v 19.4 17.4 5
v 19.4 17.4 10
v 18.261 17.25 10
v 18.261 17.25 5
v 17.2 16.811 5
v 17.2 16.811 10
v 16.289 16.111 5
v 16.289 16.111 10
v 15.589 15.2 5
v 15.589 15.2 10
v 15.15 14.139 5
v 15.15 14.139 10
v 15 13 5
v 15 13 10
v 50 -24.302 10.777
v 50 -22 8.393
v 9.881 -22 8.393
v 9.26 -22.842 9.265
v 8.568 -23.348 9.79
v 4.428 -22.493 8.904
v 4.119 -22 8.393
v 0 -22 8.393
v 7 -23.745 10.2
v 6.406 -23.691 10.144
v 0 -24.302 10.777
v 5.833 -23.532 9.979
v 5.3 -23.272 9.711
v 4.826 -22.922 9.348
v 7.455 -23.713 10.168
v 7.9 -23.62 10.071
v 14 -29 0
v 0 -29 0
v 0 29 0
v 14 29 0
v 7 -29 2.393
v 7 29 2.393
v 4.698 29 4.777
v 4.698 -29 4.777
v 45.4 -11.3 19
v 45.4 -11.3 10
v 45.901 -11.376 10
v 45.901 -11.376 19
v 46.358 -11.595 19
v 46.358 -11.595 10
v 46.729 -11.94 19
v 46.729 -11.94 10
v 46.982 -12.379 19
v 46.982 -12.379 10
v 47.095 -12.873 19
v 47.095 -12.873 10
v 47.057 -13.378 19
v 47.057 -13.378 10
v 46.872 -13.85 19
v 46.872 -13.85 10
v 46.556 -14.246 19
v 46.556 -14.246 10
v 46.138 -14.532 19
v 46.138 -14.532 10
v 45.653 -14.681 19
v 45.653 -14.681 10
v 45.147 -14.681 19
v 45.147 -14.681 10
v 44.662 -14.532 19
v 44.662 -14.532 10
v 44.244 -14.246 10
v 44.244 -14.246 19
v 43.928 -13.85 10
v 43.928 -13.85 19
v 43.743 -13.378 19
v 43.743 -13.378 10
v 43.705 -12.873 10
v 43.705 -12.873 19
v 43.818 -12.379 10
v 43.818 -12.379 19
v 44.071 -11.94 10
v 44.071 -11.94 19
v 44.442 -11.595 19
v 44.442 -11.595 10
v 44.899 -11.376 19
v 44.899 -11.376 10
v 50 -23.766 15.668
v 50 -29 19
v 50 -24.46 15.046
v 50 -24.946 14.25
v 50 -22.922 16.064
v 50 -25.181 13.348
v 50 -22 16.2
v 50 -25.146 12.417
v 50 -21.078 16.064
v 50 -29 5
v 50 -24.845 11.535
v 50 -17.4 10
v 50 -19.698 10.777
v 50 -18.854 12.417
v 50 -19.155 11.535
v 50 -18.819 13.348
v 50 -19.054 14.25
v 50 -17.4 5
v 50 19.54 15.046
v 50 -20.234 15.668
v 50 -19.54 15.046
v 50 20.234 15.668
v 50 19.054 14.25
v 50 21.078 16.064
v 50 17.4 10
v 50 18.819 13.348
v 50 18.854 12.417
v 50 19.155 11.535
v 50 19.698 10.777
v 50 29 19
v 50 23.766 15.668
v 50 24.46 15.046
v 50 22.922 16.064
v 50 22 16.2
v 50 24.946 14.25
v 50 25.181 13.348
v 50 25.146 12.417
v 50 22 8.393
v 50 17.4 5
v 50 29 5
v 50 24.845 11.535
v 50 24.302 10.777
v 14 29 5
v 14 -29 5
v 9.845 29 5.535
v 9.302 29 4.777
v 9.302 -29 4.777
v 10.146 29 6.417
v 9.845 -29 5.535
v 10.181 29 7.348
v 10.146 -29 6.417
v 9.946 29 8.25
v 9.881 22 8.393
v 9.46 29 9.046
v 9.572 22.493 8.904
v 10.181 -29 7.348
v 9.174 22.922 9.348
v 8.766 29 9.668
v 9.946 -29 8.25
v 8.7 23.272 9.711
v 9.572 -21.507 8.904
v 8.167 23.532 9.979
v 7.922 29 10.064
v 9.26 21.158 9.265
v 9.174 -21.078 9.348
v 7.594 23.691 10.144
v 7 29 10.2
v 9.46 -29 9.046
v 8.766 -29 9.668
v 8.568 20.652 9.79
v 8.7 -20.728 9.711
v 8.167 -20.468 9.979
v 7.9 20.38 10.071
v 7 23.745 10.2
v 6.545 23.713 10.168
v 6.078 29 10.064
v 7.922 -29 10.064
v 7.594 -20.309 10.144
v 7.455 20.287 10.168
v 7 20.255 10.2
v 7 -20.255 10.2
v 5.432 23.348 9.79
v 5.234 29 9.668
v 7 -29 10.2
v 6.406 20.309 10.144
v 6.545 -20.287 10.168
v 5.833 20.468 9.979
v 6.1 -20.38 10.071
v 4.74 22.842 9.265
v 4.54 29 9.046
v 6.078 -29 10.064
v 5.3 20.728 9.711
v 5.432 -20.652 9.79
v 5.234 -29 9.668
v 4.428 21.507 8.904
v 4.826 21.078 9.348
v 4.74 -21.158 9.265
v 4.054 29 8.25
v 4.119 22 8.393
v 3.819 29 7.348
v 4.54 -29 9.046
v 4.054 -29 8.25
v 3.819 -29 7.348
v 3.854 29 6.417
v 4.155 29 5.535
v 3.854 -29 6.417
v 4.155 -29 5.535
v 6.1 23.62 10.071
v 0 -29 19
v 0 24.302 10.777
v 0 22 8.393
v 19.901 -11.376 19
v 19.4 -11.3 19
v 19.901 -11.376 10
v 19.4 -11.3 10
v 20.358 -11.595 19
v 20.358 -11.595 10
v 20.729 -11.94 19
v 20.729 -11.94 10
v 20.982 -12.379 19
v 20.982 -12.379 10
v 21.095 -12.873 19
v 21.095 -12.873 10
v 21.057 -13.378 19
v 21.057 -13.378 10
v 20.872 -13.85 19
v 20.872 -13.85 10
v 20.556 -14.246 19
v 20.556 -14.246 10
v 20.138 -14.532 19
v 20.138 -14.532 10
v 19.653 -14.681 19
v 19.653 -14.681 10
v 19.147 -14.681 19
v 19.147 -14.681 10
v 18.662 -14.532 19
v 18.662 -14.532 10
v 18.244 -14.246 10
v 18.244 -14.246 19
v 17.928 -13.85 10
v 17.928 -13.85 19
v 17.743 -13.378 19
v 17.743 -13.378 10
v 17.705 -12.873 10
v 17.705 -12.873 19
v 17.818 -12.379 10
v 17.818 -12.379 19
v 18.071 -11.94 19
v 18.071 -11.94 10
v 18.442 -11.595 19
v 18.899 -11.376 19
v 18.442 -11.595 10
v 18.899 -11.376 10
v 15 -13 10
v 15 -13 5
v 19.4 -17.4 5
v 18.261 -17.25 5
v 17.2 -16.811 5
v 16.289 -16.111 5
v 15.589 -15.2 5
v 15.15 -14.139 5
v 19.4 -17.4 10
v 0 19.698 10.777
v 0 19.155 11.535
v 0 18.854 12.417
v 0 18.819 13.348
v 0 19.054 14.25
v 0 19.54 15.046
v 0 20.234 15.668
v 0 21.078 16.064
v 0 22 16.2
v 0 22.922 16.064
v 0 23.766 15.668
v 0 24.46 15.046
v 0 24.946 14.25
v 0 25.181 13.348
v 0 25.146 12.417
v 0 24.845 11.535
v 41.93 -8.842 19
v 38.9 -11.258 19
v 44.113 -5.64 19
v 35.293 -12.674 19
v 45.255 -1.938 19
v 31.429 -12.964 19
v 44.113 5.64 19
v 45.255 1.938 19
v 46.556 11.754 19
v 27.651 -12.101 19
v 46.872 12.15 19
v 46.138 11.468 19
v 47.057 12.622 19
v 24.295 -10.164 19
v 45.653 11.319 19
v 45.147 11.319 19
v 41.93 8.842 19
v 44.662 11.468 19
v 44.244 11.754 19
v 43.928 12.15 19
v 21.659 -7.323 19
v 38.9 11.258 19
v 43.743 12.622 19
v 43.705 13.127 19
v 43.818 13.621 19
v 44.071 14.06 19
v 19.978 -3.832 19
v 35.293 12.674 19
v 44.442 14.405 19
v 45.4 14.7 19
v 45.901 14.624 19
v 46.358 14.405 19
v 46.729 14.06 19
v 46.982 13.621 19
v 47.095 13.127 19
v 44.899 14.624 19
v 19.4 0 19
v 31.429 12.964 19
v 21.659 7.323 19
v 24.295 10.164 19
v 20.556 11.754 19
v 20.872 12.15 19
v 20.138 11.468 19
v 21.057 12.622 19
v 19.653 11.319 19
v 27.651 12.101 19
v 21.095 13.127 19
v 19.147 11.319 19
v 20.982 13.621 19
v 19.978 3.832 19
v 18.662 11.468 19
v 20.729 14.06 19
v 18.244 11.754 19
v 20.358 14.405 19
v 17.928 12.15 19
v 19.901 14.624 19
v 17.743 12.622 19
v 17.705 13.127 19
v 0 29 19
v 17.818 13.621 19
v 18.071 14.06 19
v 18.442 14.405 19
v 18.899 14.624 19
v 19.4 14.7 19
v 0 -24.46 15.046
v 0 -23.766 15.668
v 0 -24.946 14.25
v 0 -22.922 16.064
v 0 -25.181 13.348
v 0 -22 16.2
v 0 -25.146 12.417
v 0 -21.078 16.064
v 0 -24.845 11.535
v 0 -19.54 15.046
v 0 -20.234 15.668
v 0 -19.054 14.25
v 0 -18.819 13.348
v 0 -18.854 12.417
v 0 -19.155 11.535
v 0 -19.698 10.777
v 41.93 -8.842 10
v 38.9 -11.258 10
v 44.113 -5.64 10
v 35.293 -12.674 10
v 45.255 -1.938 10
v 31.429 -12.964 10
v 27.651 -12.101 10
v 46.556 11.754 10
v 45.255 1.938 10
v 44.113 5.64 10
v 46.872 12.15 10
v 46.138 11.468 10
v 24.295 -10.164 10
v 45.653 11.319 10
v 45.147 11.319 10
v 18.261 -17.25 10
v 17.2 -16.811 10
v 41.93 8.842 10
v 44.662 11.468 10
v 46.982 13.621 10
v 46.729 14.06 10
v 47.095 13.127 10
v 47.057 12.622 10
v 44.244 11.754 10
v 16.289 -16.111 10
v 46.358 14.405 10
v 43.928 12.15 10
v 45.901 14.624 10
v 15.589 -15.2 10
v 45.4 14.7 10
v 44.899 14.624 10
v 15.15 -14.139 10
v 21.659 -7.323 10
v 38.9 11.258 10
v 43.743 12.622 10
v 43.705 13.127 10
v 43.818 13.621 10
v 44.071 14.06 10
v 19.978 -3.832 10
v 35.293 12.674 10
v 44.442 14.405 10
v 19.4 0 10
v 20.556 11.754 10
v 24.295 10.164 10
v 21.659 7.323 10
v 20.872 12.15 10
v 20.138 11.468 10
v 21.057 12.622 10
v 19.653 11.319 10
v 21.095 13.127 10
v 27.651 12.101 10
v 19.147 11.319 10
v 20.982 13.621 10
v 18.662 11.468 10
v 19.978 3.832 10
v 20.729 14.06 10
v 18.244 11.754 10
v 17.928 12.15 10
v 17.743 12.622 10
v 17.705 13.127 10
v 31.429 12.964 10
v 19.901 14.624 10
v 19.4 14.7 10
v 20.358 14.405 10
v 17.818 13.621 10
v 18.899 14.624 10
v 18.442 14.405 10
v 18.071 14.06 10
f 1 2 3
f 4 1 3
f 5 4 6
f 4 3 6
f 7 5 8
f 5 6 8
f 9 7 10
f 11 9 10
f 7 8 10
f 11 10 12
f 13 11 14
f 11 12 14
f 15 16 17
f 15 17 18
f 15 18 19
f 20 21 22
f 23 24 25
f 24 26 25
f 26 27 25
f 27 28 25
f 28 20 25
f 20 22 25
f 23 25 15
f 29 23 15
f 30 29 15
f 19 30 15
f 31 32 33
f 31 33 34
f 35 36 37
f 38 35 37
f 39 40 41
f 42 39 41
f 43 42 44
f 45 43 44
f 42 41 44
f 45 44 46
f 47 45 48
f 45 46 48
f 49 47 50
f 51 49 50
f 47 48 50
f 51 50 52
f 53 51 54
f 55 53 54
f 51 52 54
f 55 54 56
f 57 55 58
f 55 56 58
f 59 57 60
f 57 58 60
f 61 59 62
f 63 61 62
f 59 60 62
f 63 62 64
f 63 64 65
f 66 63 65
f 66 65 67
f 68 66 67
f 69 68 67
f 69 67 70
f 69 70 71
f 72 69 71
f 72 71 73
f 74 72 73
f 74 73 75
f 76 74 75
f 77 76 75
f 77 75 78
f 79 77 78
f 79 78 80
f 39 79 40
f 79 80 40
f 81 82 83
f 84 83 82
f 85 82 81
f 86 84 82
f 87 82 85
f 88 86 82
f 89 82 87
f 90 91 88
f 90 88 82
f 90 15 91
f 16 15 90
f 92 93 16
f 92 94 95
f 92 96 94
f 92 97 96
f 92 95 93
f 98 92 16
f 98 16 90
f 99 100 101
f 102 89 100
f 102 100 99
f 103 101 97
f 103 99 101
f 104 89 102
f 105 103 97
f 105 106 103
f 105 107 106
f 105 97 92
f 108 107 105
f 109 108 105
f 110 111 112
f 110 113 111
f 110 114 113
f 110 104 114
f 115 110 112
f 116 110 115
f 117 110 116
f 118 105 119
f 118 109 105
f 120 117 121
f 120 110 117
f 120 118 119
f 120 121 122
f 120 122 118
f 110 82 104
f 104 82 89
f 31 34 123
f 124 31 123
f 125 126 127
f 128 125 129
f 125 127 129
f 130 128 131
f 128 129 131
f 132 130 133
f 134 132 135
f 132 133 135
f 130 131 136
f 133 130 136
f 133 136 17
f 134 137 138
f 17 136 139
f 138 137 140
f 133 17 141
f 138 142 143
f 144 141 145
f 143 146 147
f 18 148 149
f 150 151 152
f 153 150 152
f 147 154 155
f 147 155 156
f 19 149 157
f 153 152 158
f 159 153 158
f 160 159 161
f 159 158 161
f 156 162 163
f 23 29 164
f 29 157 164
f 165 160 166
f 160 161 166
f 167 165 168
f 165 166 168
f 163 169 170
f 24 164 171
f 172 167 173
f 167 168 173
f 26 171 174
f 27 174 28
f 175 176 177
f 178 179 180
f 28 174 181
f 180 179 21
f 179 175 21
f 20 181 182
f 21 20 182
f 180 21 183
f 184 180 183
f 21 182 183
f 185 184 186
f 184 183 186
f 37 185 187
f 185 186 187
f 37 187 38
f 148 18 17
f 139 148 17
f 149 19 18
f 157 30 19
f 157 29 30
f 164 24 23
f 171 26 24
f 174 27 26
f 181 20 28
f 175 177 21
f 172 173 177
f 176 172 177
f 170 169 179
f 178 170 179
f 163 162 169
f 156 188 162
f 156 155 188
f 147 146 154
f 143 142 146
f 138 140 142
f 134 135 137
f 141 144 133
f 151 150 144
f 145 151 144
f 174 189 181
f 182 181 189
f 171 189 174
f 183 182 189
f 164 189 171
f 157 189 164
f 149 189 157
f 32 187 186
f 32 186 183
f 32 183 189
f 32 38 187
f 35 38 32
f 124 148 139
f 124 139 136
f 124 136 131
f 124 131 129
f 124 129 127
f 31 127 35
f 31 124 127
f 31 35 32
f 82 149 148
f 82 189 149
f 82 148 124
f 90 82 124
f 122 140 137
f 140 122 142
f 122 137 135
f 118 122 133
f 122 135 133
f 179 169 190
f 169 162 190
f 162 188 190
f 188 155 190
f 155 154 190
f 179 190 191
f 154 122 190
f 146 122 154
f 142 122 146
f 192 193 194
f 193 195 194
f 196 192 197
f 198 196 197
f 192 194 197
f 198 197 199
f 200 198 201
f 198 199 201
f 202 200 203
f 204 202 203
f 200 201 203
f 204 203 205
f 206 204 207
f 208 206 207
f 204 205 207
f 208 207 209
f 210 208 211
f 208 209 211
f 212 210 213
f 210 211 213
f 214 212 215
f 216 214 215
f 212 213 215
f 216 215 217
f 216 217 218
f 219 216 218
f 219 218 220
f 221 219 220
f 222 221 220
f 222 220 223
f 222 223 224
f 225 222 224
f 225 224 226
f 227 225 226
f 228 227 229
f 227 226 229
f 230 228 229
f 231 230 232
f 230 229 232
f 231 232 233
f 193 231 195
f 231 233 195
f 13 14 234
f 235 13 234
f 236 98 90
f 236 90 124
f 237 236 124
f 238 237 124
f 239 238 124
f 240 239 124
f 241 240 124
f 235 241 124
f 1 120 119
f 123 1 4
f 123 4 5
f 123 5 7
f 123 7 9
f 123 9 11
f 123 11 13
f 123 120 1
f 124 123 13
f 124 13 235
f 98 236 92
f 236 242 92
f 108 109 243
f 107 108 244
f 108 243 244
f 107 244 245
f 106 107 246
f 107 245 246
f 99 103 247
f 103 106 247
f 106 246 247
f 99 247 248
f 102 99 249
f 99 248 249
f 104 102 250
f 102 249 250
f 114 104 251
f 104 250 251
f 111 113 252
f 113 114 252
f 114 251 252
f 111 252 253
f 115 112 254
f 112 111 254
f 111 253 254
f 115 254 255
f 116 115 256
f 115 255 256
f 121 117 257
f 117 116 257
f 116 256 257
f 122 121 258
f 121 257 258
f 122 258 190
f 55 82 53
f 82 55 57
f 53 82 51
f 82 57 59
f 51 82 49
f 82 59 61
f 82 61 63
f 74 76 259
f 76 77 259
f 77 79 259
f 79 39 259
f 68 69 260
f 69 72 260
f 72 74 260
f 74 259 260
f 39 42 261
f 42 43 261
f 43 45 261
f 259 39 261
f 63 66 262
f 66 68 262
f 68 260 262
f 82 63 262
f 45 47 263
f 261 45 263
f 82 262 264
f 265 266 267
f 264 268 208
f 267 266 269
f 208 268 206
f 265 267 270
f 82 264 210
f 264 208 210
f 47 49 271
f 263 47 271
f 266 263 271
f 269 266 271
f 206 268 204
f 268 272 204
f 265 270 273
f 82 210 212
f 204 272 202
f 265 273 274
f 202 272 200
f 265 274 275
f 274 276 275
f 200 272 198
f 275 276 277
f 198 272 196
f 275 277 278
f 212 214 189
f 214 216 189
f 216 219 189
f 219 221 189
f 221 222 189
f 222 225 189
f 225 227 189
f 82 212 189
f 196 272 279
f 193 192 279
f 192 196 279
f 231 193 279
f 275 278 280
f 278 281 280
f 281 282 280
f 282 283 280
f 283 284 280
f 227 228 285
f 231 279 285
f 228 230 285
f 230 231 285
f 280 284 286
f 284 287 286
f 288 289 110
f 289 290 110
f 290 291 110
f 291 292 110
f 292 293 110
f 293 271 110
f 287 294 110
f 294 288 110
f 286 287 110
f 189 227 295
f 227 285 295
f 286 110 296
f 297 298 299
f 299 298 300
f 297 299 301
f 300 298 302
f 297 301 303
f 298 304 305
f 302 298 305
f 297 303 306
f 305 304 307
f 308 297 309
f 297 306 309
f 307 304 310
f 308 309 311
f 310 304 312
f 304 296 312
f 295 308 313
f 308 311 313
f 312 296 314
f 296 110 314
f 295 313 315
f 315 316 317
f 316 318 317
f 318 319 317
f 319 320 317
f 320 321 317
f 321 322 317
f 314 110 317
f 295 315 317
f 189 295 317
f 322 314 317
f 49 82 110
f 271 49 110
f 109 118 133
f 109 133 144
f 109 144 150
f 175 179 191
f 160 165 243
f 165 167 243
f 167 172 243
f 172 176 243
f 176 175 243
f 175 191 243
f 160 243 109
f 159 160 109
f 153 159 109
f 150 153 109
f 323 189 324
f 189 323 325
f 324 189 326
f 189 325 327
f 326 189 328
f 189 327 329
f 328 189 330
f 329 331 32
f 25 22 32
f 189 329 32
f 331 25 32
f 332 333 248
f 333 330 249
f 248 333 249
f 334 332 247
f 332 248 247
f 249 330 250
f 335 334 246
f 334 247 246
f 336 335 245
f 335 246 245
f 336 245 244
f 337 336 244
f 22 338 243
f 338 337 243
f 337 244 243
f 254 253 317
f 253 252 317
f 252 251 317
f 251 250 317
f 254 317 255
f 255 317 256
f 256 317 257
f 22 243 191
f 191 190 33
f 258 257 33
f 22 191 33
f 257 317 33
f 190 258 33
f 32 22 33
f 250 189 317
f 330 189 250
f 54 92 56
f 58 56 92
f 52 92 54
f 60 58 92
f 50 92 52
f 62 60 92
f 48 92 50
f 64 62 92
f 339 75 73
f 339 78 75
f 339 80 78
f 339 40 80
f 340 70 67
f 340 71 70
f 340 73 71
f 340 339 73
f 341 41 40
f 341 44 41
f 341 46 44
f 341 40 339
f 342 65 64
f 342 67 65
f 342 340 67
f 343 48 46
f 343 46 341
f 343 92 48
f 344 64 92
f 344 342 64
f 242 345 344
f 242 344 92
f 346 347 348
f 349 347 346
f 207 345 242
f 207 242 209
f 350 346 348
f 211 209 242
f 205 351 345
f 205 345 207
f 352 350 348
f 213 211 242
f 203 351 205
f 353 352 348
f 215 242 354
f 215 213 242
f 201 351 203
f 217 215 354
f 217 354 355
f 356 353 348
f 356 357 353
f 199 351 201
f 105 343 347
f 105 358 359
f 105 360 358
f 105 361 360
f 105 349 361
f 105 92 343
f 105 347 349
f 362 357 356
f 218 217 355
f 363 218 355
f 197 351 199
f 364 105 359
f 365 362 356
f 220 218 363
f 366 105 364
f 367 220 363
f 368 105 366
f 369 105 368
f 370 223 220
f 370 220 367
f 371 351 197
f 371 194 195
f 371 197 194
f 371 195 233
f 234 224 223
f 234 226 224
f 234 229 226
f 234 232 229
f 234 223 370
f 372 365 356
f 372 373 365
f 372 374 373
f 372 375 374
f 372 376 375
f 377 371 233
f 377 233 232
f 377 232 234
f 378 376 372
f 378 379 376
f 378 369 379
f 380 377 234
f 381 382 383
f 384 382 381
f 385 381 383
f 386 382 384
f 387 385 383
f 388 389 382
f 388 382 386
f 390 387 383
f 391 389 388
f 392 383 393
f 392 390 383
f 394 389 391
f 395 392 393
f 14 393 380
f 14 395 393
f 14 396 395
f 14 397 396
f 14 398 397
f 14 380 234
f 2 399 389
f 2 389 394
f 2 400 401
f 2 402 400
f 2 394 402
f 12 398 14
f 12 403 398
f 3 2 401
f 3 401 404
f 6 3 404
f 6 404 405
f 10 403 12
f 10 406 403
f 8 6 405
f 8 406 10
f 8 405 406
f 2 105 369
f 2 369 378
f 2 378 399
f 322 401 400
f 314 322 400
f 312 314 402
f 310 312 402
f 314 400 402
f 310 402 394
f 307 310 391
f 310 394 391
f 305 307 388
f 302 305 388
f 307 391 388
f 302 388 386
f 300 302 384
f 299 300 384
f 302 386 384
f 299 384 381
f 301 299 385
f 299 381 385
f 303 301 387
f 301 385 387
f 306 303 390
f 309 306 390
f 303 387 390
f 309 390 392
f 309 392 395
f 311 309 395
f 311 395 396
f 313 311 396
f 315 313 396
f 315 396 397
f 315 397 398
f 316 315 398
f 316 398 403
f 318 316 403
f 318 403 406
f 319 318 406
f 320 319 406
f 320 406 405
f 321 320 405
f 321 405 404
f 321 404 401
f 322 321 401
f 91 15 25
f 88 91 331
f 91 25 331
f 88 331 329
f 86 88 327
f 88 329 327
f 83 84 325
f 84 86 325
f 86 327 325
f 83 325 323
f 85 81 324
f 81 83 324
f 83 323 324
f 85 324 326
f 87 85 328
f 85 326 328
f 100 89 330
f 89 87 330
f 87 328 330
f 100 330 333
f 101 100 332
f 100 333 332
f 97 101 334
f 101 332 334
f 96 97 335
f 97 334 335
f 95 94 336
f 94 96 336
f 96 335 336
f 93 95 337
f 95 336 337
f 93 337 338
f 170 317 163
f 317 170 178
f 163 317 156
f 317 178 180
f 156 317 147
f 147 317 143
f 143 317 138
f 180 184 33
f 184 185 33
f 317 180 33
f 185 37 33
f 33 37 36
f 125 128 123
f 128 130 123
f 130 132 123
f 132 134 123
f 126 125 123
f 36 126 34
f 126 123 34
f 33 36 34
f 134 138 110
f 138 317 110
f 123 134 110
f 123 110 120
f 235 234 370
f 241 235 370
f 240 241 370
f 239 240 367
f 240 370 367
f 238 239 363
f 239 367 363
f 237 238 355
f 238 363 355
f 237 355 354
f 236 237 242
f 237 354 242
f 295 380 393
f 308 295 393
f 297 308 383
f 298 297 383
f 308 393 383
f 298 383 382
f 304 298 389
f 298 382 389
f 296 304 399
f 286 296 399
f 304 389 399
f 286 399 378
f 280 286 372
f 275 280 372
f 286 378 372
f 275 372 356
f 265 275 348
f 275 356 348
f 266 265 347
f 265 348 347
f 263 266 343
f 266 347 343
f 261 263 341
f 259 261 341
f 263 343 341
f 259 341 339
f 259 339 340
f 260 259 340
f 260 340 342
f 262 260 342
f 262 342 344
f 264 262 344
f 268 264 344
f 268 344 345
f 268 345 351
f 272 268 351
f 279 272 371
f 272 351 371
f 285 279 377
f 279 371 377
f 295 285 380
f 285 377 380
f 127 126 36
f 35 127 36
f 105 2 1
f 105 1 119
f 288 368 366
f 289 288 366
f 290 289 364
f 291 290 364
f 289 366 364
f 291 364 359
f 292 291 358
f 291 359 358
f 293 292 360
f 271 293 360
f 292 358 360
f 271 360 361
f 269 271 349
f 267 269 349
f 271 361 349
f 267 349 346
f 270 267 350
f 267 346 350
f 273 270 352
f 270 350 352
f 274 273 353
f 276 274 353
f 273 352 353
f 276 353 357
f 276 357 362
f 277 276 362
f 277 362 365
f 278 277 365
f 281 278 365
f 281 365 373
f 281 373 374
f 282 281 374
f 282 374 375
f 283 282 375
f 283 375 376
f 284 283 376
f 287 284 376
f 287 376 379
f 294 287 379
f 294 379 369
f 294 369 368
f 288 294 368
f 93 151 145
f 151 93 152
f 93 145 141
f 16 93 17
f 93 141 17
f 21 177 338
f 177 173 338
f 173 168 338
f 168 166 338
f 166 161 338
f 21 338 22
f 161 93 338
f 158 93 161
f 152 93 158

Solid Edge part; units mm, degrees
sketch "Sketch1" plane through (0, 0, 0) normal (0, -1, 0) x (1, 0, 0)
  line L0 (0, 0) -> (14, 0)
  line L1 (14, 0) -> (14, 5)
  line L2 (50, 5) -> (14, 5)
  line L3 (50, 19) -> (50, 5)
  line L4 (14, 19) -> (50, 19)
  line L5 (14, 19) -> (0, 19)
  line L6 (0, 19) -> (0, 0)
  dimension "D1" = 36
  dimension "D2" = 14
  dimension "D3" = 19
  dimension "D4" = 14
  dimension "D5" = 5
extrude "Protrusion1" add sketch "Sketch1" along normal mid plane 58
sketch "Sketch2" plane through (0, 0, 10.5) normal (-1, 0, 0) x (0, -1, 0)
  circle A0 centre (-22, 2.5) radius 3.2
  dimension "D1" = 7
  dimension "D2" = 6
extrude "Cutout1" cut sketch "Sketch2" against normal through all
mirror "Mirror1" about plane through (0, 0, 0) normal (0, -1, 0) of "Cutout1"
sketch "Sketch3" plane through (27, -29, 10.5) normal (0, -1, 0) x (0, 0, 1)
  circle A0 centre (-3.5, 20) radius 3.2
  dimension "D1" = 7
  dimension "D2" = 7
  dimension "D3" = 6.4
extrude "Cutout2" cut sketch "Sketch3" against normal through all
sketch "Sketch4" plane through (32, 0, 5) normal (0, 0, -1) x (-1, 0, 0)
  circle A0 centre (-0.4, 0) radius 13
  dimension "D1" = 2
extrude "Cutout3" cut sketch "Sketch4" against normal through all
sketch "Sketch5" plane through (32, 0, 10) normal (0, 0, -1) x (0, -1, 0)
  line L0 (17.4, 12.6) -> (17.4, -22.4304)
  line L1 (-13, 17) -> (13, 17)
  line L2 (-17.4, 12.6) -> (-17.4, -23.1466)
  arc A0 (-13, 17) -> (-17.4, 12.6) centre (-13, 12.6) ccw
  arc A1 (17.4, 12.6) -> (13, 17) centre (13, 12.6) ccw
extrude "Cutout4" cut sketch "Sketch5" along normal through all material side at (36.9152, -17.35, 10)
sketch "Sketch6" plane through (0, 0, 10.5) normal (-1, 0, 0) x (0, 1, 0)
  line L0 (-22, -2.5) -> (-19.6981, -0.2771)
  line L1 (-19.6981, -0.2771) -> (-22, 2.1066)
  line L2 (-22, 2.1066) -> (-24.3019, -0.2771)
  line L3 (-24.3019, -0.2771) -> (-22, -2.5)
extrude "Cutout5" cut sketch "Sketch6" against normal through all
mirror "Mirror2" about plane through (0, 0, 0) normal (0, -1, 0) of "Cutout5"
sketch "Sketch7" plane through (25, 29, 10.5) normal (0, 1, 0) x (1, 0, 0)
  line L0 (-18, 3.5) -> (-15.6981, 5.7229)
  line L1 (-15.6981, 5.7229) -> (-18, 8.1066)
  line L2 (-18, 8.1066) -> (-20.3019, 5.7229)
  line L3 (-20.3019, 5.7229) -> (-18, 3.5)
extrude "Cutout7" cut sketch "Sketch7" against normal through all
sketch "Sketch8" plane through (32.5, 0, 10) normal (0, 0, -1) x (0, 1, 0)
  circle A0 centre (-13, 12.9) radius 1.7
  circle A1 centre (13, 12.9) radius 1.7
  circle A2 centre (13, -13.1) radius 1.7
  circle A3 centre (-13, -13.1) radius 1.7
extrude "Cutout8" cut sketch "Sketch8" against normal through all
